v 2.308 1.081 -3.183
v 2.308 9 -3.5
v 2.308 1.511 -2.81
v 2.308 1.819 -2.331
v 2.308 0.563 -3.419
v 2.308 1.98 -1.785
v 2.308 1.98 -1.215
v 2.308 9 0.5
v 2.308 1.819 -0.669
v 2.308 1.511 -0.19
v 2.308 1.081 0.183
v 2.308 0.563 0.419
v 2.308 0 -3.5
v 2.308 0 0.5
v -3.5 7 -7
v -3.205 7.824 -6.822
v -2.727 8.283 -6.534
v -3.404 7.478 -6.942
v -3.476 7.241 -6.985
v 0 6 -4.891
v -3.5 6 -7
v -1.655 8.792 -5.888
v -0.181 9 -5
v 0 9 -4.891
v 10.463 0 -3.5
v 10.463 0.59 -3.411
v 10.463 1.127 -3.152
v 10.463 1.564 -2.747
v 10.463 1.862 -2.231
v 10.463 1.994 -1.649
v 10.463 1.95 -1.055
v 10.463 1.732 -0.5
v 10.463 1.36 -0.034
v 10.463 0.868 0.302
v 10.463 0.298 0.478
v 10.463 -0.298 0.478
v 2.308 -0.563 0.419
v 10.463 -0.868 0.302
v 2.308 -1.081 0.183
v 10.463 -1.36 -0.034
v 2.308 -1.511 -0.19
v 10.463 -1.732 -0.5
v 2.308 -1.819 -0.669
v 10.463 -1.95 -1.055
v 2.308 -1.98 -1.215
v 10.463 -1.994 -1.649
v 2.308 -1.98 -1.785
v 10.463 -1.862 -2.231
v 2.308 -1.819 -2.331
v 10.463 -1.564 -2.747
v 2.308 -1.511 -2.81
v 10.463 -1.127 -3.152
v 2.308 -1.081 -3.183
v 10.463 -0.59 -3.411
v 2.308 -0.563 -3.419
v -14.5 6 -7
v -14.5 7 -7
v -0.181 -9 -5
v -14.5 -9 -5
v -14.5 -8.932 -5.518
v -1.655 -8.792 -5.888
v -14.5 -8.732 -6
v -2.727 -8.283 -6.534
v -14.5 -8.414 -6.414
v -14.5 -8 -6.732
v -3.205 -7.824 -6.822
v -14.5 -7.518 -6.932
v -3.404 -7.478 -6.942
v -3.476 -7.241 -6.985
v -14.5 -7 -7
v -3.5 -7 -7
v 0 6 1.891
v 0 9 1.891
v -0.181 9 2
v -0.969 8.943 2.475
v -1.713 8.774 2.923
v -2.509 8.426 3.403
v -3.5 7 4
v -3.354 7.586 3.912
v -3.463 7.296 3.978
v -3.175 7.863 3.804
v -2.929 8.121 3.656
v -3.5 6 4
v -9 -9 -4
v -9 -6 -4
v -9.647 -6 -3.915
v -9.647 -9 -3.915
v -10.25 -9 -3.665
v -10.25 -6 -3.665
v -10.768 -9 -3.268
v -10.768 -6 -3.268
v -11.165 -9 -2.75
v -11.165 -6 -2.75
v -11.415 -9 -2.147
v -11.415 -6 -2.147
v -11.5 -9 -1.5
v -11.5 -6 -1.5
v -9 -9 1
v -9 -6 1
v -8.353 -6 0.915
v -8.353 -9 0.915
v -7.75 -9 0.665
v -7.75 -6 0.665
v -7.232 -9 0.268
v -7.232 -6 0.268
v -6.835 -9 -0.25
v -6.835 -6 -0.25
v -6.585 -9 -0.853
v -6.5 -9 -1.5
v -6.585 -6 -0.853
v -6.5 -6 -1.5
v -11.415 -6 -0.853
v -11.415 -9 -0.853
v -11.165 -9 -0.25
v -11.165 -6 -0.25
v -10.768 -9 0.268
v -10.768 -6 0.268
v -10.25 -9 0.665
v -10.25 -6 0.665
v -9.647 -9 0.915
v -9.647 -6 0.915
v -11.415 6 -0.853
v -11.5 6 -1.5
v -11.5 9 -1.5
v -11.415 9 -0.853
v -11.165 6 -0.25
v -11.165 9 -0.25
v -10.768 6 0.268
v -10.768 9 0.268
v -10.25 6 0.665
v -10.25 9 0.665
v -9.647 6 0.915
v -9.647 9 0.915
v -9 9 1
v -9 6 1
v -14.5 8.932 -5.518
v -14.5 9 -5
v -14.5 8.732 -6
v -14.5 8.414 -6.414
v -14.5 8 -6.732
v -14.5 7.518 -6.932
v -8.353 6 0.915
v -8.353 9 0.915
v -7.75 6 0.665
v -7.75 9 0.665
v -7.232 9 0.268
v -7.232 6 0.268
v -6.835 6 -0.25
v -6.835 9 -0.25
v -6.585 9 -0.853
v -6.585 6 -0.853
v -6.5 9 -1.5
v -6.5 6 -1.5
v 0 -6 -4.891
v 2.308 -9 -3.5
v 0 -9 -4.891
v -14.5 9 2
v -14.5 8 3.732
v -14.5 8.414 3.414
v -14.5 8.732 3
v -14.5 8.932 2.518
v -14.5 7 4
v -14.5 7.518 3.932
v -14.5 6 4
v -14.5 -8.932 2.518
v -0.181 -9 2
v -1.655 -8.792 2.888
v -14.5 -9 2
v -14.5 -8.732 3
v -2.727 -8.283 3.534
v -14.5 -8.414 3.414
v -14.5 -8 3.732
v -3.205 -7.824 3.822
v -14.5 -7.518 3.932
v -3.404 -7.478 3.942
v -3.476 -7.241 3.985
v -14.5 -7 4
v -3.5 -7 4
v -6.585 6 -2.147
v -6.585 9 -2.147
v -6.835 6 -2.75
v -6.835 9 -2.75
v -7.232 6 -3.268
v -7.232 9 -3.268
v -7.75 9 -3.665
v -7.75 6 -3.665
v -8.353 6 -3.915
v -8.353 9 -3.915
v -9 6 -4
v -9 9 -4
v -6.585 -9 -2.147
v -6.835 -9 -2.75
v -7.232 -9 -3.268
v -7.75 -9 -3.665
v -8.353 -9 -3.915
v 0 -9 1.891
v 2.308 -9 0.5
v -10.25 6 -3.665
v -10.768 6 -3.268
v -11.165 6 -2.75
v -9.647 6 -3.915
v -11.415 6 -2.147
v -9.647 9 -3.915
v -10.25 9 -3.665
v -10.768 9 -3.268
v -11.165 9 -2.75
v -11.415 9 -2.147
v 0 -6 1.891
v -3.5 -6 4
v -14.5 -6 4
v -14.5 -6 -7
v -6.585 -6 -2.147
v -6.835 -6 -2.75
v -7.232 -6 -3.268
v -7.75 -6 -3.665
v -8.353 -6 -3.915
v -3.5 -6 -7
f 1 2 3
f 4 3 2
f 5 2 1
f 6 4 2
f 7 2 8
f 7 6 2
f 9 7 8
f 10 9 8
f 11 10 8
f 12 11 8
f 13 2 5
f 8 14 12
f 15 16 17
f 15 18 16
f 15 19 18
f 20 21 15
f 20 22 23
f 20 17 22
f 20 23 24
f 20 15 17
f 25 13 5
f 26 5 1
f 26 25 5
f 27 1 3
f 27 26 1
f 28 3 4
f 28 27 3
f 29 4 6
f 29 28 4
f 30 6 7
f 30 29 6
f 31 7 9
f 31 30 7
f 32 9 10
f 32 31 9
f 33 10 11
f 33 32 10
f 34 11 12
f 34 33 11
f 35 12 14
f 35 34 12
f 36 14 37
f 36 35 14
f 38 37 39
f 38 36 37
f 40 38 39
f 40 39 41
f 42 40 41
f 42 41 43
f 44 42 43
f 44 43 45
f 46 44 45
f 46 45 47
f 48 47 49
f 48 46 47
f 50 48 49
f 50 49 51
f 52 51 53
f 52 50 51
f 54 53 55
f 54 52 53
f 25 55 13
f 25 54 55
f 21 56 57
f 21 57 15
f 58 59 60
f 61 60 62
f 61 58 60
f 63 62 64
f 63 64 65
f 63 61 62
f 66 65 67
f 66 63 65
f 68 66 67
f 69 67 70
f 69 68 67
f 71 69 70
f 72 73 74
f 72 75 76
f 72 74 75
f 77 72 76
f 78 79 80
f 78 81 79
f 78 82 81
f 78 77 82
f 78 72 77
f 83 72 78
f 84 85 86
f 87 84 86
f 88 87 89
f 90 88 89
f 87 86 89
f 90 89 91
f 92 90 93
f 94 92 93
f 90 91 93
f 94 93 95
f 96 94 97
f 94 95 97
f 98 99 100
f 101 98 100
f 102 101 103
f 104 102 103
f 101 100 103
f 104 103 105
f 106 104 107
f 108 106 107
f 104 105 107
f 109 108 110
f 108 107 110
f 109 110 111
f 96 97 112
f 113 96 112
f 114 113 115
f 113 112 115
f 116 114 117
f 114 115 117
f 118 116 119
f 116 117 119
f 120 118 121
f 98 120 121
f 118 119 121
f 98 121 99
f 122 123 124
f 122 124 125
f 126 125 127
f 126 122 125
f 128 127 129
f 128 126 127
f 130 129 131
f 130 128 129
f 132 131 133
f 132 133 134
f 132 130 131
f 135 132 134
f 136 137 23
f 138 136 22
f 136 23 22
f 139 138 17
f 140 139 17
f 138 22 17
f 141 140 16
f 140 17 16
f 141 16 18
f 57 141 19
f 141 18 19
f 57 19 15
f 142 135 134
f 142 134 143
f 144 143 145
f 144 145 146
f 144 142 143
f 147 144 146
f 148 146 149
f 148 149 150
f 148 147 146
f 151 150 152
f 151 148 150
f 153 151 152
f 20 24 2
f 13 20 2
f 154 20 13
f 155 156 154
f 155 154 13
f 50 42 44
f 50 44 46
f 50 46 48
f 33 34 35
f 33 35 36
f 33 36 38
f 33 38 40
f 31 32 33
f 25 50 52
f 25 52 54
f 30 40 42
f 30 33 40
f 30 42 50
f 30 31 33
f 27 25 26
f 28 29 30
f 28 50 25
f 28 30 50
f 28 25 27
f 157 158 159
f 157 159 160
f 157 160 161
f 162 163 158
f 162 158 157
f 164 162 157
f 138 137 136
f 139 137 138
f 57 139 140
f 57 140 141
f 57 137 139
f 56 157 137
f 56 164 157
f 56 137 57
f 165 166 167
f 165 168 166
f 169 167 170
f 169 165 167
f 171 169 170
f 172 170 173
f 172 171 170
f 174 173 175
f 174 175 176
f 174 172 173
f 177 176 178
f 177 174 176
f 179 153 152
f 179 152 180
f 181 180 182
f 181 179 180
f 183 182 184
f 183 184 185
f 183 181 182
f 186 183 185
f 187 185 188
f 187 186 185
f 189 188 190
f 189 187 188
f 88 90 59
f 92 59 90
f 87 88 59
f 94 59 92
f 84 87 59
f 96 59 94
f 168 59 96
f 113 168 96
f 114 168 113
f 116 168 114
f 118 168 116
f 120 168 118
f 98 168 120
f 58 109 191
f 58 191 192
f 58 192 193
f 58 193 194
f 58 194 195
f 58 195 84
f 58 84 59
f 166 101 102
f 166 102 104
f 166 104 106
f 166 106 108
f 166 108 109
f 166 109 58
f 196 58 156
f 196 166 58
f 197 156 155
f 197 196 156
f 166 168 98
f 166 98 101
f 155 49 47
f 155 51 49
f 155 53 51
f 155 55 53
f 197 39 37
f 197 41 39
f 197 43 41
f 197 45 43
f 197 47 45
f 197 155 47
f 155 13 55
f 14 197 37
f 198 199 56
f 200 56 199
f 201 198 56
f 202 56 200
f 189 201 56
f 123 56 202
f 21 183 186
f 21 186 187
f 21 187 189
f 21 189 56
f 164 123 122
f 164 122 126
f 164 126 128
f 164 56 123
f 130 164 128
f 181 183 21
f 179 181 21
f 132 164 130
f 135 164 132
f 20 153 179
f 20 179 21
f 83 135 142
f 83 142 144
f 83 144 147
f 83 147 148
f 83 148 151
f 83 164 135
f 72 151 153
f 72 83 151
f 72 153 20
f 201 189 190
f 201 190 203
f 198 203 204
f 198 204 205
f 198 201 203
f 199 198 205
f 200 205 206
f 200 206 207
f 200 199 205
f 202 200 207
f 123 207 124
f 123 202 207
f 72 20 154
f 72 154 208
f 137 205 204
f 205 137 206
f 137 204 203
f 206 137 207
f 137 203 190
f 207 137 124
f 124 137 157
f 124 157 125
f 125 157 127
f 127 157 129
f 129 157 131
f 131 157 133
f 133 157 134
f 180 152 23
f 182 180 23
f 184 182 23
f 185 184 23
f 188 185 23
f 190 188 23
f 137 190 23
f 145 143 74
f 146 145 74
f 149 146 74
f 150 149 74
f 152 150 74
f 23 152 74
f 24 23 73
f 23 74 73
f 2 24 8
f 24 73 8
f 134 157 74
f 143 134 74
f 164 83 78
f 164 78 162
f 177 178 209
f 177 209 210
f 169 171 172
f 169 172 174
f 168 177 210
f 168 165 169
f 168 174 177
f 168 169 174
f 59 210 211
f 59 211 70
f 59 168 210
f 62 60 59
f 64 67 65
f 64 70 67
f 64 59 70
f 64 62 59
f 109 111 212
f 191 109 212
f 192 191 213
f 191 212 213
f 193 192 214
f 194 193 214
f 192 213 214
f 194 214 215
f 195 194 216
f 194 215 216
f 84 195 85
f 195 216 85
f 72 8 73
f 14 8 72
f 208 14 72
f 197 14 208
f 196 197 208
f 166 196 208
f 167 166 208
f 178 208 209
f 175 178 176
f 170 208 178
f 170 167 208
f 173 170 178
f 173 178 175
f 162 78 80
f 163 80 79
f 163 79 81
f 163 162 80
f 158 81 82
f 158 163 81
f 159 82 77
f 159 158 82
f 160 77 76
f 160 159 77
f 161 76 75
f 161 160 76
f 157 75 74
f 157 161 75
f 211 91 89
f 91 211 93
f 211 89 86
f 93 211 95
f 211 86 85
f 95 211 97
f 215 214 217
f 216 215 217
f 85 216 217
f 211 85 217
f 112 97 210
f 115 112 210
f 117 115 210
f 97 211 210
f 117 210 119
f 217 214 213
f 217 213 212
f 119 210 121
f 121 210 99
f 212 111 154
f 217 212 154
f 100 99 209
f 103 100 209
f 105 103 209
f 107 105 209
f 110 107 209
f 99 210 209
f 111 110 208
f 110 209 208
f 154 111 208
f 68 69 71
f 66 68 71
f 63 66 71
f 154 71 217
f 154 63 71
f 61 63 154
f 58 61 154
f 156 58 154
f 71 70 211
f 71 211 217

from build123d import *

# Parameters (mm, degrees)
F3_W     = 8.1543137785
F3_H     = 2
F5_DEPTH = 9
F6_DEPTH = 6
F8_R     = 2


# Not quite as in the source:
# - a feature names something its author has since deleted; it is built from what else it names


with BuildPart() as f4:
    # F3 (on Front) → F4 (revolve)
    with BuildSketch(Plane.XZ):
        with Locations((6.3856310444, -2.5)):
            Rectangle(F3_W, F3_H)
    revolve(axis=Axis((6.3856310444, 0, -1.5), (1, 0, 0)))

    # F3 (on Front) → F5 (join, symmetric)
    with BuildSketch(Plane.XZ):
        with BuildLine():
            ThreePointArc((-9, 1), (-7.232233047, 0.267766953), (-6.5, -1.5))
            Line((-6.5, -1.5), (-3.5, -1.5))
            Line((-3.5, -1.5), (-3.5, 4))
            Line((-3.5, 4), (-9, 4))
            Line((-9, 4), (-9, 1))
        make_face()
        with BuildLine():
            Line((-3.5, -1.5), (-6.5, -1.5))
            ThreePointArc((-6.5, -1.5), (-7.232233047, -3.267766953), (-9, -4))
            Line((-9, -4), (-9, -7))
            Line((-9, -7), (-3.5, -7))
            Line((-3.5, -7), (-3.5, -1.5))
        make_face()
        with BuildLine():
            Line((-9, -7), (-9, -4))
            ThreePointArc((-9, -4), (-10.767766953, -3.267766953), (-11.5, -1.5))
            Line((-11.5, -1.5), (-14.5, -1.5))
            Line((-14.5, -1.5), (-14.5, -7))
            Line((-14.5, -7), (-9, -7))
        make_face()
        with BuildLine():
            ThreePointArc((-11.5, -1.5), (-10.767766953, 0.267766953), (-9, 1))
            Line((-9, 1), (-9, 4))
            Line((-9, 4), (-14.5, 4))
            Line((-14.5, 4), (-14.5, -1.5))
            Line((-14.5, -1.5), (-11.5, -1.5))
        make_face()
        Polygon((0, 1.8910123945), (0, -1.5), (2.3084741551, -1.5), (2.3084741551, 0.5), align=None)
        Polygon((2.3084741551, -1.5), (0, -1.5), (0, -4.8910123945), (2.3084741551, -3.5), align=None)
        Polygon((-3.5, 4), (-3.5, -1.5), (0, -1.5), (0, 1.8910123945), align=None)
        Polygon((0, -1.5), (-3.5, -1.5), (-3.5, -7), (0, -4.8910123945), align=None)
    extrude(amount=F5_DEPTH, both=True)


with BuildPart() as f6:
    # F3 (on Front) → F6 (new body, symmetric)
    with BuildSketch(Plane.XZ):
        with BuildLine():
            ThreePointArc((-11.5, -1.5), (-10.767766953, 0.267766953), (-9, 1))
            Line((-9, 1), (-9, 4))
            Line((-9, 4), (-14.5, 4))
            Line((-14.5, 4), (-14.5, -1.5))
            Line((-14.5, -1.5), (-11.5, -1.5))
        make_face()
        with BuildLine():
            ThreePointArc((-9, 1), (-7.232233047, 0.267766953), (-6.5, -1.5))
            Line((-6.5, -1.5), (-3.5, -1.5))
            Line((-3.5, -1.5), (-3.5, 4))
            Line((-3.5, 4), (-9, 4))
            Line((-9, 4), (-9, 1))
        make_face()
        with BuildLine():
            Line((-3.5, -1.5), (-6.5, -1.5))
            ThreePointArc((-6.5, -1.5), (-7.232233047, -3.267766953), (-9, -4))
            Line((-9, -4), (-9, -7))
            Line((-9, -7), (-3.5, -7))
            Line((-3.5, -7), (-3.5, -1.5))
        make_face()
        with BuildLine():
            Line((-9, -7), (-9, -4))
            ThreePointArc((-9, -4), (-10.767766953, -3.267766953), (-11.5, -1.5))
            Line((-11.5, -1.5), (-14.5, -1.5))
            Line((-14.5, -1.5), (-14.5, -7))
            Line((-14.5, -7), (-9, -7))
        make_face()
        Polygon((-3.5, 4), (-3.5, -1.5), (0, -1.5), (0, 1.8910123945), align=None)
        Polygon((0, -1.5), (-3.5, -1.5), (-3.5, -7), (0, -4.8910123945), align=None)
    extrude(amount=F6_DEPTH, both=True)


with BuildPart() as f4_1:
    add(f4.part)

    # F7: cut F6
    add(f6.part, mode=Mode.SUBTRACT)

    # F8
    f8_edges = [f4_1.edges().sort_by_distance(p)[0] for p in [
        (-9, -9, 4),
        (-9, -9, -7),
        (-9, 9, -7),
        (-9, 9, 4),
    ]]
    fillet(f8_edges, radius=F8_R)


solid = f4_1.part
